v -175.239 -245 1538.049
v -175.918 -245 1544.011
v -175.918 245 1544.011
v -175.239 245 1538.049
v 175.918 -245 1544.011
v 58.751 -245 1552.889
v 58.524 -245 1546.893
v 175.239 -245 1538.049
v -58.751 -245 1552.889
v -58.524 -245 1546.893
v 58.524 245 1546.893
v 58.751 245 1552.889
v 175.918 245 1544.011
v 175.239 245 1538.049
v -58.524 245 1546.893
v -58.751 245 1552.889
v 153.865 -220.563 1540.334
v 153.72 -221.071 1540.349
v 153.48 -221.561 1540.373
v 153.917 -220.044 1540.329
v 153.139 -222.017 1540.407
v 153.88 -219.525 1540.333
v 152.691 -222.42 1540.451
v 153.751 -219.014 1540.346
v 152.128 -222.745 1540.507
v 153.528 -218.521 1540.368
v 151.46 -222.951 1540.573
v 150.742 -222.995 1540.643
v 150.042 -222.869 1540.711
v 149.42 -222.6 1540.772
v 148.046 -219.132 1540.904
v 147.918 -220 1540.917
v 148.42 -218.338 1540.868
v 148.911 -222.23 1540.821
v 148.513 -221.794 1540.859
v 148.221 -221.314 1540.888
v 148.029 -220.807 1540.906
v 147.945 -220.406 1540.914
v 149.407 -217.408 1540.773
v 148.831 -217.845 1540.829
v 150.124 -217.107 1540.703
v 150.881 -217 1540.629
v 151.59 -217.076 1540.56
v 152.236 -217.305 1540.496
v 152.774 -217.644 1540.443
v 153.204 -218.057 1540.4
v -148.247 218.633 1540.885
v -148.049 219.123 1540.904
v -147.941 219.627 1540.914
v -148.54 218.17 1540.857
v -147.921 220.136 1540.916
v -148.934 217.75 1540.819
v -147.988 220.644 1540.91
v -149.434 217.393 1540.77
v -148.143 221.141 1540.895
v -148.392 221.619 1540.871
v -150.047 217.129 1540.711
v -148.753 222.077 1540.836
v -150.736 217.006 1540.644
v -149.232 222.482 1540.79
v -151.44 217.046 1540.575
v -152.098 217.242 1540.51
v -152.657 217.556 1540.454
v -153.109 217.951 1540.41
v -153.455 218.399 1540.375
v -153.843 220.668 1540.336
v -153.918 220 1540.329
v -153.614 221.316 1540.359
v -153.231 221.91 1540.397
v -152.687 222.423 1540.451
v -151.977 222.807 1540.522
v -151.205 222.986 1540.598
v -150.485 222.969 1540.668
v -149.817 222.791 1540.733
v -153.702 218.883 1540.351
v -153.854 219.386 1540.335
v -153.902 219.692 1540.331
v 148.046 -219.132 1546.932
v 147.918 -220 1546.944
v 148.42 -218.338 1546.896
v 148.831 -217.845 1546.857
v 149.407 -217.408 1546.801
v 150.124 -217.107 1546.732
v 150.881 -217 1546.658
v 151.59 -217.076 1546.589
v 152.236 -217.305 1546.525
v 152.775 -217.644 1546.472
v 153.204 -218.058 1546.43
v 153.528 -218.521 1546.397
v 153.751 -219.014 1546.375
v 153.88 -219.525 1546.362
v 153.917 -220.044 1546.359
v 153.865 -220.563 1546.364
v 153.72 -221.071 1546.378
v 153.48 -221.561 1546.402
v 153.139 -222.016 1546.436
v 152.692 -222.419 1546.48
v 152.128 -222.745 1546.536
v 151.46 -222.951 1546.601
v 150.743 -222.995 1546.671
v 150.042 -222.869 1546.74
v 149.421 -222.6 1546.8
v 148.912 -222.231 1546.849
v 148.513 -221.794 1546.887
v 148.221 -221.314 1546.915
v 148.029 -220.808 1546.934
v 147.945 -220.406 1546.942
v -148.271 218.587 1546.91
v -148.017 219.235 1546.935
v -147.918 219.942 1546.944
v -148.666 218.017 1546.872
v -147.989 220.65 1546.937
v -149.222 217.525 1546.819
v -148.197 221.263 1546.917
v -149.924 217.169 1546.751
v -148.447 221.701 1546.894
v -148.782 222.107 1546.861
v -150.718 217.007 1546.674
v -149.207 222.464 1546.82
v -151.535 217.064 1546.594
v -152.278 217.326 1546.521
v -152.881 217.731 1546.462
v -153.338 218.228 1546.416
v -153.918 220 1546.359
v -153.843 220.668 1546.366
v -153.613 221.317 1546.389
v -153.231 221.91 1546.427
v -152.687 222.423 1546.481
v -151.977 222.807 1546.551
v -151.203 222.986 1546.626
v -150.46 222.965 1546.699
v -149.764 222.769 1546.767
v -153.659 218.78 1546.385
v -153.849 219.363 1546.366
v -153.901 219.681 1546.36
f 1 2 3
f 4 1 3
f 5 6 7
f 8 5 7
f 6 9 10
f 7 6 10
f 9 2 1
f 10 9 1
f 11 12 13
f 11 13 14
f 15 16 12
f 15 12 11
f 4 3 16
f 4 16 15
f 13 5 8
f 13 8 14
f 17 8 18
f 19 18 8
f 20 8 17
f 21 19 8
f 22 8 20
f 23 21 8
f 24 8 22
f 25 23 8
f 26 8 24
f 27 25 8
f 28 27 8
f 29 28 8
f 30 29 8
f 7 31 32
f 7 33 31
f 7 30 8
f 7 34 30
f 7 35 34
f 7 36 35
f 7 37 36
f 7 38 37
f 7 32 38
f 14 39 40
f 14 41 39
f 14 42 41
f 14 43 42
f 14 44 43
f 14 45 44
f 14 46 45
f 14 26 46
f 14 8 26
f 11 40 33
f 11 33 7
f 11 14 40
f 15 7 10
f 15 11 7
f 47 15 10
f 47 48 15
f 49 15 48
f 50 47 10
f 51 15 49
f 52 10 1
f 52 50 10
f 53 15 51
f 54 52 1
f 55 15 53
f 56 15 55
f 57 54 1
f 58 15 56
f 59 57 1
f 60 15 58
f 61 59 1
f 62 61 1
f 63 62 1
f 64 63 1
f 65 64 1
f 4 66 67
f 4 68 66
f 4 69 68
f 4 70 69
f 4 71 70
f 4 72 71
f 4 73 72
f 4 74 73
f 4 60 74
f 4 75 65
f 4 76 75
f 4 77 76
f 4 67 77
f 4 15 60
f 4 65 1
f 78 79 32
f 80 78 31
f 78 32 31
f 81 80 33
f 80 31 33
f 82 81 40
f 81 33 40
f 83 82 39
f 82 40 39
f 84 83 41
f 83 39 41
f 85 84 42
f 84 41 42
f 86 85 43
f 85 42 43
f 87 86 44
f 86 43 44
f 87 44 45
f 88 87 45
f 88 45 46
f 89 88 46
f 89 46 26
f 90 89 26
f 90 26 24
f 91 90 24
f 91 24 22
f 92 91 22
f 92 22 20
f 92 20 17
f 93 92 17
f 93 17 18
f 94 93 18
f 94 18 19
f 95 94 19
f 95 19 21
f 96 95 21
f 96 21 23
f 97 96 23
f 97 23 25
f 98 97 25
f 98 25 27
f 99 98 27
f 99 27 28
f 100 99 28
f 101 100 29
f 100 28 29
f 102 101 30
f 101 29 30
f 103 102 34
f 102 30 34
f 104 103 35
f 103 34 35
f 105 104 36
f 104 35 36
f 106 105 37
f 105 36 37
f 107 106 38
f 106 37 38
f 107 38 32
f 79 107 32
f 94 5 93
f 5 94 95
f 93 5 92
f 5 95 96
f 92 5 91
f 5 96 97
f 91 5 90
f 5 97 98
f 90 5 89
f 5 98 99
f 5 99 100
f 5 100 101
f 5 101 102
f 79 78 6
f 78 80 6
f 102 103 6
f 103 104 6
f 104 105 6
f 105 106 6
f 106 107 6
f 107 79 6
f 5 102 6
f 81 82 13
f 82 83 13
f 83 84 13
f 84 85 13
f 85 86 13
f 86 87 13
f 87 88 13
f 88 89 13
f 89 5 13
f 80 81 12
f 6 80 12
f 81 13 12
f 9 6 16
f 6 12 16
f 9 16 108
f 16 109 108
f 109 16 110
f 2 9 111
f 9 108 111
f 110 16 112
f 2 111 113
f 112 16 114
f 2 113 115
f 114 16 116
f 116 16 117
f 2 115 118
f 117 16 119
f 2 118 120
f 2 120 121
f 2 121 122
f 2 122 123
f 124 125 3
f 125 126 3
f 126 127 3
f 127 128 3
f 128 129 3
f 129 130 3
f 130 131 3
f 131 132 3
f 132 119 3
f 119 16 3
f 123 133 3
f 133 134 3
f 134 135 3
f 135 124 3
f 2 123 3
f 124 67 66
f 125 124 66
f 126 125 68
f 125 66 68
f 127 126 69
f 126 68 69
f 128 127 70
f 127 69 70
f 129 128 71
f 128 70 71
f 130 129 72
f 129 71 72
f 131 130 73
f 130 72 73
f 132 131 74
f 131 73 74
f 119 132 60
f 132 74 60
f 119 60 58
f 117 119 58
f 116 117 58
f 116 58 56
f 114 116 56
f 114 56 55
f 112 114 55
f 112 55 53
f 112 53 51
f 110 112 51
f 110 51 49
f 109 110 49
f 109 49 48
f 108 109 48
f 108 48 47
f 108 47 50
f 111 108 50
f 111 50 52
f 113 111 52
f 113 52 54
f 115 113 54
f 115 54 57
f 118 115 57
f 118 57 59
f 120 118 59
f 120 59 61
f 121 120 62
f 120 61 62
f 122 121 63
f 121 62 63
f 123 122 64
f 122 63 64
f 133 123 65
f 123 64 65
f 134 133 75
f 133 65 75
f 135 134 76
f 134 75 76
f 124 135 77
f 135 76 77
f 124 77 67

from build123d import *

# Parameters (mm, degrees)
F0_W     = 490
F0_H     = 6
F1_ANGLE = 13
F4_D     = 6
F4_DEPTH = 100


with BuildPart() as f1:
    # F0 (on Right) → F1 (revolve, symmetric)
    with BuildSketch(Plane.YZ) as f1_sk:
        with Locations((0, 1551)):
            Rectangle(F0_W, F0_H)
    revolve(axis=Axis((0, -0.207613, 0), (0, 1, 0)), revolution_arc=F1_ANGLE / 2)
    revolve(f1_sk.sketch, axis=Axis((0, -0.207613, 0), (0, -1, 0)), revolution_arc=F1_ANGLE / 2)

    # F4
    with Locations(Plane.XY.offset(1600)):
        with Locations((-150.917794, 220), (150.917794, -220)):
            Hole(F4_D / 2, depth=F4_DEPTH)


solid = f1.part
